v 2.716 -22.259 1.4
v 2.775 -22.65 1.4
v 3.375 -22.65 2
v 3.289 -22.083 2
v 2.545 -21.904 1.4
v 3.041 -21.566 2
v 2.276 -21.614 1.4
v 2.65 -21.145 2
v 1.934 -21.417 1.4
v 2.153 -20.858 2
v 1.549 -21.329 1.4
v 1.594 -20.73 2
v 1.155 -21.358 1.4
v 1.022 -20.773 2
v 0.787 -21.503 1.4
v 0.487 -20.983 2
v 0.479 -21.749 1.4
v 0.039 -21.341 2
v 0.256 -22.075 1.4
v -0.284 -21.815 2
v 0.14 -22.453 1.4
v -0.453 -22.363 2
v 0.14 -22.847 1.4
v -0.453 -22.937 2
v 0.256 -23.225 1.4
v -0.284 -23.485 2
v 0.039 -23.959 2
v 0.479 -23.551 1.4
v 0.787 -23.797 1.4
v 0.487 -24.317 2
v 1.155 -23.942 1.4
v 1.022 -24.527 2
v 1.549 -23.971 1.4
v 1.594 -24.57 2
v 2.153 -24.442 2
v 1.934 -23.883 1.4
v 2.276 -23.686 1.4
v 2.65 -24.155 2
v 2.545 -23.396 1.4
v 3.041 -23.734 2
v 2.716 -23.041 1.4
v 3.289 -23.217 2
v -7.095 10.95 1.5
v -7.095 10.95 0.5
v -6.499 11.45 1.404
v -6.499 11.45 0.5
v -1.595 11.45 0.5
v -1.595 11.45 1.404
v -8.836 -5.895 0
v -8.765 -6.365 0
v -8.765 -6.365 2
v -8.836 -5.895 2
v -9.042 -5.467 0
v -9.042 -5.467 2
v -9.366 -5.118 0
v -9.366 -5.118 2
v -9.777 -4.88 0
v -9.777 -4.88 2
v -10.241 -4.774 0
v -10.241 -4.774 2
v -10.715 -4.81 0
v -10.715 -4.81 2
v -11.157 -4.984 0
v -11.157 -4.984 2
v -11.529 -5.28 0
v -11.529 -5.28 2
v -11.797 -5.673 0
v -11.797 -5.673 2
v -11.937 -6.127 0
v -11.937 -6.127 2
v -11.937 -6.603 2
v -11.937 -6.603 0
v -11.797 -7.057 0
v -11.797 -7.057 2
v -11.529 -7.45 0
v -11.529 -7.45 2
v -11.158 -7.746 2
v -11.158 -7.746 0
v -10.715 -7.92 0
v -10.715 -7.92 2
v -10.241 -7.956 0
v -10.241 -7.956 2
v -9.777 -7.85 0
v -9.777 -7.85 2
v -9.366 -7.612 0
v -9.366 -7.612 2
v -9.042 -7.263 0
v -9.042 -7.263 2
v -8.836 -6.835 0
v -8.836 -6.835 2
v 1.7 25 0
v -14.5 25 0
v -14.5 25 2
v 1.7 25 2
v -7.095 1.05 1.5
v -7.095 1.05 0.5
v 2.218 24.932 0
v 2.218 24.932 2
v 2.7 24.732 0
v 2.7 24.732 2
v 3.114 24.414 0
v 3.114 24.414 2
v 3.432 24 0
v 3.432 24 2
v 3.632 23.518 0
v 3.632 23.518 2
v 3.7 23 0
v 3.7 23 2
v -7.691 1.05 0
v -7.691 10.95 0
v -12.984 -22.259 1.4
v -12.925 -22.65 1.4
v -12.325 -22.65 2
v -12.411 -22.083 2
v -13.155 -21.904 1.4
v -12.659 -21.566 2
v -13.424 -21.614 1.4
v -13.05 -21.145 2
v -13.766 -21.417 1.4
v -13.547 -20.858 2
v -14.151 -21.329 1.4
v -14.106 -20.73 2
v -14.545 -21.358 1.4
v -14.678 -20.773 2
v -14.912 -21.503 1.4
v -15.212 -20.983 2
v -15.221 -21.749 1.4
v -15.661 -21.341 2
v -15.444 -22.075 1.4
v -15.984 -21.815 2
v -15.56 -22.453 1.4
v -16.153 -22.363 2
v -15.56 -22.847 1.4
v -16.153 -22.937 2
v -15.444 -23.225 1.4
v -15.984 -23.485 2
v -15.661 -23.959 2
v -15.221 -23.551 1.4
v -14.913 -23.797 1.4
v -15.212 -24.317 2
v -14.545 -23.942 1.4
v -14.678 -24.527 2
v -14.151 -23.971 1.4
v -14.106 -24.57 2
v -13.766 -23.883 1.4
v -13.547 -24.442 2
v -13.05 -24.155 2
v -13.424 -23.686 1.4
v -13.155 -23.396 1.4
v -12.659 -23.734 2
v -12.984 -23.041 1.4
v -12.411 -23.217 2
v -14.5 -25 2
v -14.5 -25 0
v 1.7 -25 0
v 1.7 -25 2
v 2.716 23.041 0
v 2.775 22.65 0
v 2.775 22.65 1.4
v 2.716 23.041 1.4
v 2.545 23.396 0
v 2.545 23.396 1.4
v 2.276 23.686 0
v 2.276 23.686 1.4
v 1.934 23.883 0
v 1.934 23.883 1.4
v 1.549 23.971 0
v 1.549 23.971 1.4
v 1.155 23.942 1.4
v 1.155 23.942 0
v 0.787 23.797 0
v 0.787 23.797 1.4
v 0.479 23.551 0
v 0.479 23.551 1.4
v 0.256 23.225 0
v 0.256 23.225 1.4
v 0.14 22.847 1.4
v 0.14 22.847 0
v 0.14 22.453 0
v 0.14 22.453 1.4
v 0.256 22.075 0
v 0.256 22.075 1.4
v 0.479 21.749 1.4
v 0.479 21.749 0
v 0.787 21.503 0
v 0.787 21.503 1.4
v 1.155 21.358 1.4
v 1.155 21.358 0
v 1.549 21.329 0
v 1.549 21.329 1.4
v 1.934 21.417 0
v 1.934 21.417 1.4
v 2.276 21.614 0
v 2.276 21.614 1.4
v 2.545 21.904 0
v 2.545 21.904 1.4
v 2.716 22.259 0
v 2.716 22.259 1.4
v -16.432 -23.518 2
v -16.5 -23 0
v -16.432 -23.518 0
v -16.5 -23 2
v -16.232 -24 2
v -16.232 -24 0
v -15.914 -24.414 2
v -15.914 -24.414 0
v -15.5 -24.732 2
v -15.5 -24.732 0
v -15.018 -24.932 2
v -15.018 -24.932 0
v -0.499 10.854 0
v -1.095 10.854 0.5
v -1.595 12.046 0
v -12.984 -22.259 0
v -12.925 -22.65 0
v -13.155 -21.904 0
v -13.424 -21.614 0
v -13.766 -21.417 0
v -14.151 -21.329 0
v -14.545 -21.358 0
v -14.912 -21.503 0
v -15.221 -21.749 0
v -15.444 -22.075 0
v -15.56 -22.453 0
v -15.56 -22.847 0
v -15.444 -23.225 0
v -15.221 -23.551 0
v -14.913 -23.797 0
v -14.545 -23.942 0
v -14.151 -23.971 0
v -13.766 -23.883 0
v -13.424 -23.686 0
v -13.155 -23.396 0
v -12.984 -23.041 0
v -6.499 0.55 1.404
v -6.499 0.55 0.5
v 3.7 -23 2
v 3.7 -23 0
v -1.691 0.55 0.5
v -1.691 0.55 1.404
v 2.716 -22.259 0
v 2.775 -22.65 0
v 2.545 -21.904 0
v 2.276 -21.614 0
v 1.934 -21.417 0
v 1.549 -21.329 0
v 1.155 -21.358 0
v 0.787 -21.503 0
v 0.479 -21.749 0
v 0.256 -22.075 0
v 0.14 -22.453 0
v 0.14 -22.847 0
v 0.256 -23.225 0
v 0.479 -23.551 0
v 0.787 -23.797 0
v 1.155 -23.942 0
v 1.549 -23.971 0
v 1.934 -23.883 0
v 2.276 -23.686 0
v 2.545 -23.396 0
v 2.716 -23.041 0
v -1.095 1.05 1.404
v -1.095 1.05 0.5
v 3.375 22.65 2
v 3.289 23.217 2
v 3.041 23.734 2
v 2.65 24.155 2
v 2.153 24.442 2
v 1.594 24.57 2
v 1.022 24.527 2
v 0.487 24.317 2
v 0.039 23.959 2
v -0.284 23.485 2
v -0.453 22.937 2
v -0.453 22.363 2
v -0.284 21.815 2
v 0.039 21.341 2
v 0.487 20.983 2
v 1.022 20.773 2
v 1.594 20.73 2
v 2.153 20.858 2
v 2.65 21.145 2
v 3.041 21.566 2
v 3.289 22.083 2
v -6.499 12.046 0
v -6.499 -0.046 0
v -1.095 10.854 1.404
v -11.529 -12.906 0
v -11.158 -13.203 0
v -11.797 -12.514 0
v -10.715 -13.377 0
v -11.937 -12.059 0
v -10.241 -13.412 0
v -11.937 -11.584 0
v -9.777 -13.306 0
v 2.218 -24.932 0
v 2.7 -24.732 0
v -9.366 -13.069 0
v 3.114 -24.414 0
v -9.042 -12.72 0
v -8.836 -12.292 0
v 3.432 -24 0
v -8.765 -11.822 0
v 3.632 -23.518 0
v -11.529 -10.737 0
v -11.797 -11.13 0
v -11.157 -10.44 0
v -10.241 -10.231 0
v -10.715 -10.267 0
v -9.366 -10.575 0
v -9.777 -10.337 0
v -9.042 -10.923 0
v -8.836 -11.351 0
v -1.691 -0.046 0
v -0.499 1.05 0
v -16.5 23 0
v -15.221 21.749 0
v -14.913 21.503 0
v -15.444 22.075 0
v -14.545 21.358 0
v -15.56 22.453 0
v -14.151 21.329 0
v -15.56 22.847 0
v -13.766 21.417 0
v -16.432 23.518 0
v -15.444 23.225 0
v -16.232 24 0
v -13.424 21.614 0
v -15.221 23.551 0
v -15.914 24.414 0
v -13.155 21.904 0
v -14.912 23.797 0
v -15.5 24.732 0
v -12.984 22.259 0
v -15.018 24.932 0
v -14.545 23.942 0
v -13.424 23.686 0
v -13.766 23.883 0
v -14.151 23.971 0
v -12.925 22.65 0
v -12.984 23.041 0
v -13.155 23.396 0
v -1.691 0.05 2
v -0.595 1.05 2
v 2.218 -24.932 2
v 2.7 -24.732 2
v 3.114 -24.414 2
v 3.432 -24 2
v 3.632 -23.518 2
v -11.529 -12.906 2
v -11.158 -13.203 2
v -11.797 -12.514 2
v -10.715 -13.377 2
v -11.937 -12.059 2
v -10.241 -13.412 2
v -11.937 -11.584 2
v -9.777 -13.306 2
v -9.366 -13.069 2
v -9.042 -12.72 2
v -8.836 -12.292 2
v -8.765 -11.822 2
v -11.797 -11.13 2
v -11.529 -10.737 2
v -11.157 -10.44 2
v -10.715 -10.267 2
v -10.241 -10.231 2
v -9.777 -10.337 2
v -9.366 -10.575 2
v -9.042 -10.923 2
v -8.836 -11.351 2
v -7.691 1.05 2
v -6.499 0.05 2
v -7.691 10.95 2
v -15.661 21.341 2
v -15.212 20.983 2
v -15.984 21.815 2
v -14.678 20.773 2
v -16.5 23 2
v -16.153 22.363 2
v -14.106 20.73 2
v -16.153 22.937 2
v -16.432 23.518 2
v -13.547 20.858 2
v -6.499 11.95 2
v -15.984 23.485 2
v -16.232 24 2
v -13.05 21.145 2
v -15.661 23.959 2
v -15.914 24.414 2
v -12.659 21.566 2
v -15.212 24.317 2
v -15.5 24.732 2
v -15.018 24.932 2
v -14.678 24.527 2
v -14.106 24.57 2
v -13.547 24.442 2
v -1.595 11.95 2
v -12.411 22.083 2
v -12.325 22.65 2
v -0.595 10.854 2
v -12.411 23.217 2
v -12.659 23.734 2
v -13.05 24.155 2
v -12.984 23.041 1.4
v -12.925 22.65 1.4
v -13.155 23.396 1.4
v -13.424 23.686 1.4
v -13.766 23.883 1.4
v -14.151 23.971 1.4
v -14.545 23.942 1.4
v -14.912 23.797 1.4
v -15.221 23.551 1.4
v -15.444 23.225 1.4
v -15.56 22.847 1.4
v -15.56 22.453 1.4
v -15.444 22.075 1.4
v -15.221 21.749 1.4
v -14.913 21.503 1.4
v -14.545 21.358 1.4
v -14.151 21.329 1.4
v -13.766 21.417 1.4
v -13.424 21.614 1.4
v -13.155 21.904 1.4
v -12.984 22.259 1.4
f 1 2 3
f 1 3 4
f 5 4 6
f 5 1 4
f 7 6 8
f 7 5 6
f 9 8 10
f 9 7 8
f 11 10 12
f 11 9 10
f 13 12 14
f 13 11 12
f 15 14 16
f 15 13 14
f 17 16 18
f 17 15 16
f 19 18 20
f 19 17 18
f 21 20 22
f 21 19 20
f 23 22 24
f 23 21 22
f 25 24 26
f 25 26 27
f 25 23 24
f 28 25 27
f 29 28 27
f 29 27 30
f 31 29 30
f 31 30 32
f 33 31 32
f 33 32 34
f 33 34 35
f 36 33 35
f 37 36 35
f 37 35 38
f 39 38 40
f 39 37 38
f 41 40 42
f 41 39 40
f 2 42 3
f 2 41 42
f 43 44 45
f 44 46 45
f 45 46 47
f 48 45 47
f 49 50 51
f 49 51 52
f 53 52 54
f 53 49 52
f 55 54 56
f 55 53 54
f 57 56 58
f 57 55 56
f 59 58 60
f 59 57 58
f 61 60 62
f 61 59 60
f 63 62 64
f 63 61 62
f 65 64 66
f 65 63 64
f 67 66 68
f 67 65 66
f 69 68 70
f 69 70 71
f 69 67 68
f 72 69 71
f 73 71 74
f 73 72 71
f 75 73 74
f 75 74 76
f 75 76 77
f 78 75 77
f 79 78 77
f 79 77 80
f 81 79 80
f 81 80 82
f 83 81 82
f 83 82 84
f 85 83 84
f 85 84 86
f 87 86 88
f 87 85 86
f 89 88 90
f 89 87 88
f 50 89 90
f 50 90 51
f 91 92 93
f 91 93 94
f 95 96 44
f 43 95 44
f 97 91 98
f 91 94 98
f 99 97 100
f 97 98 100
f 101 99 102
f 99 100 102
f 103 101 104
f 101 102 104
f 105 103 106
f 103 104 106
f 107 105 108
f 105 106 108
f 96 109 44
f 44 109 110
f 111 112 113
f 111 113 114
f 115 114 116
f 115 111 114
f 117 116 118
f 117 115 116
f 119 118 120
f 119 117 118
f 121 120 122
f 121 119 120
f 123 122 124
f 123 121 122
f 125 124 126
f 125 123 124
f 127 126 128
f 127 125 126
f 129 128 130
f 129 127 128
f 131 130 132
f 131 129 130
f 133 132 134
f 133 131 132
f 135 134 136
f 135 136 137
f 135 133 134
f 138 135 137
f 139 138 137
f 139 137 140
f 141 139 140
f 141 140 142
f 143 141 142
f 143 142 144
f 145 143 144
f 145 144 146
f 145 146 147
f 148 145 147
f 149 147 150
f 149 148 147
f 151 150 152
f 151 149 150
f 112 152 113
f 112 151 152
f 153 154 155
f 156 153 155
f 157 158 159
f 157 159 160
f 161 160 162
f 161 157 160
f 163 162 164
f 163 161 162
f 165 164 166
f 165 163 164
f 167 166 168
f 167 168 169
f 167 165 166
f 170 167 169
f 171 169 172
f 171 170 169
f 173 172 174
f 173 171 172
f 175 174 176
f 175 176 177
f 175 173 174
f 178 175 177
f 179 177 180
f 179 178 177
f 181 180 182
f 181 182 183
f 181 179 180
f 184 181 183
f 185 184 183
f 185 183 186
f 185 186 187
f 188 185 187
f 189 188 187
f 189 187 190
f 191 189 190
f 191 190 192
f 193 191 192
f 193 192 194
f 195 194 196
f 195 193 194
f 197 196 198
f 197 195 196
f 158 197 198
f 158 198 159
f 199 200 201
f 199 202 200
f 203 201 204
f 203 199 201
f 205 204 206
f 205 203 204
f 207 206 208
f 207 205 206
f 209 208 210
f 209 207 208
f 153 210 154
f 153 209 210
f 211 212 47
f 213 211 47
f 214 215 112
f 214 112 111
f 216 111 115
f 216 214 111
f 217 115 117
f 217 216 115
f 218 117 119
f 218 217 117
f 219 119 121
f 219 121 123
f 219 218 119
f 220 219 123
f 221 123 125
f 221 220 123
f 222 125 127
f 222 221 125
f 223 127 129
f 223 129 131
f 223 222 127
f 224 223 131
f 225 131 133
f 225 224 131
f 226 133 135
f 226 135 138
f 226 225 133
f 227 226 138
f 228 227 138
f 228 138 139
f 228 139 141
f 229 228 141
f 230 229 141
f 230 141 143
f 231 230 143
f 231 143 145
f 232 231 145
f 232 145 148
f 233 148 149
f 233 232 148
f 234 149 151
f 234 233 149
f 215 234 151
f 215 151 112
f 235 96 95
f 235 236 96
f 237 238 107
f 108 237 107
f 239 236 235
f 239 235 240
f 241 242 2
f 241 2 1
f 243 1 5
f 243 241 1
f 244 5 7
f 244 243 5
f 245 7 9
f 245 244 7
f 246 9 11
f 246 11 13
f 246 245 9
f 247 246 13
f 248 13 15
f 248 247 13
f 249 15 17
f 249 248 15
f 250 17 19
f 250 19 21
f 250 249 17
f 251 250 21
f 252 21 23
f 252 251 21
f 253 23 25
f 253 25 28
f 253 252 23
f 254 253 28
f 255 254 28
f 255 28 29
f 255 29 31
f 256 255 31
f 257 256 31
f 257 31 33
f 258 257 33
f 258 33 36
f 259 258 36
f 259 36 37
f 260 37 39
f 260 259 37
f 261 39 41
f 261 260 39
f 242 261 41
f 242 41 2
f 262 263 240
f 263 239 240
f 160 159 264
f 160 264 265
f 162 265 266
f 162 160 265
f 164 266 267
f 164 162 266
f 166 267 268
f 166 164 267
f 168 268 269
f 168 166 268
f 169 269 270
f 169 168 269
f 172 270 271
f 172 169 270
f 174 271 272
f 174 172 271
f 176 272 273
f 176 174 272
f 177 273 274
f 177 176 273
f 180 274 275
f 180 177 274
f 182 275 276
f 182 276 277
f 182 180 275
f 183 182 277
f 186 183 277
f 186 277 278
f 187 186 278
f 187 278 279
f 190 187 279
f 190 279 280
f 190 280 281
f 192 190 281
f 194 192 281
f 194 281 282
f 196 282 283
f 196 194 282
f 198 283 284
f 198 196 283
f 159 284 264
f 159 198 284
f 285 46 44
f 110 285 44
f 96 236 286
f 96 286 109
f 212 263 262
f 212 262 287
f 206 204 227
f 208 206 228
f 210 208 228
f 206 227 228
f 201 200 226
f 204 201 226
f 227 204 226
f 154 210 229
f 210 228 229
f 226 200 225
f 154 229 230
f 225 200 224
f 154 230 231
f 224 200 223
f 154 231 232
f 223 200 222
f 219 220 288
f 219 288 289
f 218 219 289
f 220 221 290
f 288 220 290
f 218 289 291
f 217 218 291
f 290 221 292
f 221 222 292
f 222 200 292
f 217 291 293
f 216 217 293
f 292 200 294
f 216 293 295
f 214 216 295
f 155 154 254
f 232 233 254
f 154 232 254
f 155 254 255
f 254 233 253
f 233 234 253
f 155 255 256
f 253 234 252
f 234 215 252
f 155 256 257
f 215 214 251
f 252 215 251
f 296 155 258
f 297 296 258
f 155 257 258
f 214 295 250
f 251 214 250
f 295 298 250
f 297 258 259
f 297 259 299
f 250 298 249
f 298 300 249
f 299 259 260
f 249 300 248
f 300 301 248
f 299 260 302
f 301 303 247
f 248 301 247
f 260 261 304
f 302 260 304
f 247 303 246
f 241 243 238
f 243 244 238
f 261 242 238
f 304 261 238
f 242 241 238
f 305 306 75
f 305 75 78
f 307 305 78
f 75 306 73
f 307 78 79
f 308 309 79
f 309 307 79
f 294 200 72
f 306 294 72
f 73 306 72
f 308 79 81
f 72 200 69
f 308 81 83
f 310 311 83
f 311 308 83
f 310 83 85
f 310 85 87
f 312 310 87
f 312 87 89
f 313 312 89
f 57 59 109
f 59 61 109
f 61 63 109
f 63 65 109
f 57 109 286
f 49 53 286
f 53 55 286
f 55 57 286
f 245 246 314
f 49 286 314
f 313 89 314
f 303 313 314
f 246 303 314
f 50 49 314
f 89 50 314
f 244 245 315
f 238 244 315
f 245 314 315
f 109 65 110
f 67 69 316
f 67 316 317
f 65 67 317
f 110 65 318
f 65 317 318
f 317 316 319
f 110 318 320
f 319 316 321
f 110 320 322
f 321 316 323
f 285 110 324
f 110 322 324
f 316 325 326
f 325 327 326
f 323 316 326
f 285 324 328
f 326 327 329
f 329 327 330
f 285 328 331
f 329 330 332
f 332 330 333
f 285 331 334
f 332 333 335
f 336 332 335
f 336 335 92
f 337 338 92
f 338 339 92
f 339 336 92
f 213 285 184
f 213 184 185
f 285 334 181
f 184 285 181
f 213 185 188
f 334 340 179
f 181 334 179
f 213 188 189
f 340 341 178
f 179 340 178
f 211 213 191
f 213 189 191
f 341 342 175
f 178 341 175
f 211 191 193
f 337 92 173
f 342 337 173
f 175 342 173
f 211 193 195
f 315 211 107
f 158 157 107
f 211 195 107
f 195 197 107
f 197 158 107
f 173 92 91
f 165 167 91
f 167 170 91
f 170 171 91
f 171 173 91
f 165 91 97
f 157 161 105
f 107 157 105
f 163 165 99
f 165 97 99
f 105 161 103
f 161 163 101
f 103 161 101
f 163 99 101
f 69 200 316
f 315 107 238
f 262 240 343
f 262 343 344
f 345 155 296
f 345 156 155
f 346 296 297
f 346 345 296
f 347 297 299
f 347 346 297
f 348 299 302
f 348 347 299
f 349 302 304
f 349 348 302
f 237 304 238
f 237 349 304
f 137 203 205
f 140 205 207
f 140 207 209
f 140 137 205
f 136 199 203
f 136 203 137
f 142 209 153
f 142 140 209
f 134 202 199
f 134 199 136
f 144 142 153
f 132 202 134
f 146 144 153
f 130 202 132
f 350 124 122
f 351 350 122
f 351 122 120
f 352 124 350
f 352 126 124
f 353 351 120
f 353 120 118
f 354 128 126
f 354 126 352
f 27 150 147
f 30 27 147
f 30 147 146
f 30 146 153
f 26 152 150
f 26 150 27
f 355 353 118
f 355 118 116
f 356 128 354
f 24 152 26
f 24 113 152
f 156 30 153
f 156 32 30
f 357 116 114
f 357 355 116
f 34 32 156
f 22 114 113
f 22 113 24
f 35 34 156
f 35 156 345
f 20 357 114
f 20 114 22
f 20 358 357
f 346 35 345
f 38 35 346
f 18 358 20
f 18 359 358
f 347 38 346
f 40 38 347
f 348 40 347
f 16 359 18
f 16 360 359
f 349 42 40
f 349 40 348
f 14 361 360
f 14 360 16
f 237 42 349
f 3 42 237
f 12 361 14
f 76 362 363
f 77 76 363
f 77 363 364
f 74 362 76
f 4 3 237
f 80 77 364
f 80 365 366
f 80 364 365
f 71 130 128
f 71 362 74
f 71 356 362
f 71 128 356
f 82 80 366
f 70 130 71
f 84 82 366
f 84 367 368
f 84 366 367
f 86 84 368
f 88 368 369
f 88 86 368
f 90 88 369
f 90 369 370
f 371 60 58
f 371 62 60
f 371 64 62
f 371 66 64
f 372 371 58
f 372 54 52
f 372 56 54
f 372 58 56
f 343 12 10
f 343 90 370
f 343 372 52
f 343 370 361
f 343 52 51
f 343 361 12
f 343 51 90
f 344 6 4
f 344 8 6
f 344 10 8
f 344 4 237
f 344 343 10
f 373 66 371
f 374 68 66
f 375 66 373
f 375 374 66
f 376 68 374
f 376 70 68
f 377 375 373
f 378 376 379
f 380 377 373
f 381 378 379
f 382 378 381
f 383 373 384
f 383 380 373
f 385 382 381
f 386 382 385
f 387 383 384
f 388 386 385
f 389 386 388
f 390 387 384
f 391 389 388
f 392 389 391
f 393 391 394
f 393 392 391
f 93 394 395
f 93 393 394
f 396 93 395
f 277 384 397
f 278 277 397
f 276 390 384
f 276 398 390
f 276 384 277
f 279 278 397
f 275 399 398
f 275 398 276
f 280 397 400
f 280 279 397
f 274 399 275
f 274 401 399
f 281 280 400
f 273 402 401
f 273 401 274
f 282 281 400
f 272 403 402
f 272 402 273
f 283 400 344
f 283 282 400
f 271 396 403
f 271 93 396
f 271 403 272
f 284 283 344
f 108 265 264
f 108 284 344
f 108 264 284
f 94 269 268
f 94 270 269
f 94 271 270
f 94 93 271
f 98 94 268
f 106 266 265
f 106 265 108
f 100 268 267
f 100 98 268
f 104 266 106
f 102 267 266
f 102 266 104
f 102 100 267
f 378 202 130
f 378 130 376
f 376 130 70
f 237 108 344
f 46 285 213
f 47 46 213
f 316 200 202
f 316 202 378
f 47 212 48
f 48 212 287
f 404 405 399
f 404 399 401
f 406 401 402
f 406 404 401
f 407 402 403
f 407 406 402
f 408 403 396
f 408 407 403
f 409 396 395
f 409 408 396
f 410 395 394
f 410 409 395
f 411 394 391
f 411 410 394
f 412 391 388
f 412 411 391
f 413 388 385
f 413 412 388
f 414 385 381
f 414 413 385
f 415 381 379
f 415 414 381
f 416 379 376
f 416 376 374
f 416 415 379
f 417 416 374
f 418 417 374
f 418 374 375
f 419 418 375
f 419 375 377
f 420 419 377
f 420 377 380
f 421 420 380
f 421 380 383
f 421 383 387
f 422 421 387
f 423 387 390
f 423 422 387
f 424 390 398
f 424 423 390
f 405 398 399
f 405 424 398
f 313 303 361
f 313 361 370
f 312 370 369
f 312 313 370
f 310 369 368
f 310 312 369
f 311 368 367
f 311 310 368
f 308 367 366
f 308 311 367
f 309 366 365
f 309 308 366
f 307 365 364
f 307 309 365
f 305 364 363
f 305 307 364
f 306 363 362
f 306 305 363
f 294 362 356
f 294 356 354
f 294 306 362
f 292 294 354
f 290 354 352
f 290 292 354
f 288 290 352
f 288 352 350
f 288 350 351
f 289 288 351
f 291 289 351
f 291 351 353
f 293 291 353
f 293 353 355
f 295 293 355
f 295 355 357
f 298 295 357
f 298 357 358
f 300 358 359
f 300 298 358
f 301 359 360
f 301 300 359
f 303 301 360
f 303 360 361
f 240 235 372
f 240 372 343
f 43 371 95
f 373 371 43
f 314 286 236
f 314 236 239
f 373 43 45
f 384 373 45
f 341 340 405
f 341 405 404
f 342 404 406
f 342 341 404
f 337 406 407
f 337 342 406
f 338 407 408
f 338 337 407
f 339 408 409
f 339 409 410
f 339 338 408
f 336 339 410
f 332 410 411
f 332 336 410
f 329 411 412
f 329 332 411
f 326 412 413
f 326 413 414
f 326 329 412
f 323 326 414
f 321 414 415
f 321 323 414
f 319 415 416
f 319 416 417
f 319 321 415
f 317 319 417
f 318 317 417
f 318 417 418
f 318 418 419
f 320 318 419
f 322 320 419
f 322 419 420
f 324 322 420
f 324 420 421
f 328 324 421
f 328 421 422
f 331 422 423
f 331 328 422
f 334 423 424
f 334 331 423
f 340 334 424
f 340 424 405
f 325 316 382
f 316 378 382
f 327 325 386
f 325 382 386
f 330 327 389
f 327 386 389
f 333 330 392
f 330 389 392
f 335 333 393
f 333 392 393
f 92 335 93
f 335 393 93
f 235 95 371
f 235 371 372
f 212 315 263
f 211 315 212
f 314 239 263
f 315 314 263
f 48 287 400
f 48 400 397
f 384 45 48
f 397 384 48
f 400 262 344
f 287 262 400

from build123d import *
from OCP.BRepFilletAPI import BRepFilletAPI_MakeChamfer

# Parameters (mm, degrees)
SKETCH_1_W      = 20.2
SKETCH_1_H      = 50
SKETCH_1_R      = 1.325
SKETCH_1_R_2    = 1.595
SKETCH_1_W_2    = 6
SKETCH_1_H_2    = 10.9
EXTRUDE_1_DEPTH = 2
FILLET_1_R      = 2
CHAMFER_1_SIZE  = 0.6
CHAMFER_2_SIZE  = 0.5
CHAMFER_2_SIZE2 = 0.595876796


with BuildPart() as part:
    # 草图1 → 凸台-拉伸1 (new body)
    with BuildSketch(Plane.XY):
        with Locations((-6.4, 0)):
            Rectangle(SKETCH_1_W, SKETCH_1_H)
        with Locations((-14.25, -22.65)):
            Circle(SKETCH_1_R, mode=Mode.SUBTRACT)
        with Locations((-14.25, 22.65)):
            Circle(SKETCH_1_R, mode=Mode.SUBTRACT)
        with Locations((1.45, 22.65)):
            Circle(SKETCH_1_R, mode=Mode.SUBTRACT)
        with Locations((1.45, -22.65)):
            Circle(SKETCH_1_R, mode=Mode.SUBTRACT)
        with Locations((-10.36, -6.365)):
            Circle(SKETCH_1_R_2, mode=Mode.SUBTRACT)
        with Locations((-10.36, -11.8216)):
            Circle(SKETCH_1_R_2, mode=Mode.SUBTRACT)
        with Locations((-4.095, 6)):
            Rectangle(SKETCH_1_W_2, SKETCH_1_H_2, mode=Mode.SUBTRACT)
    extrude(amount=EXTRUDE_1_DEPTH)

    # 圆角1
    fillet_1_edges = [part.edges().sort_by_distance(p)[0] for p in [
        (-16.5, 25, 1),
        (3.7, 25, 1),
        (3.7, -25, 1),
        (-16.5, -25, 1),
    ]]
    fillet(fillet_1_edges, radius=FILLET_1_R)

    # 倒角1
    chamfer_1_edges = [part.edges().sort_by_distance(p)[0] for p in [
        (-15.575, -22.65, 2),
        (-15.575, 22.65, 2),
        (0.125, 22.65, 2),
        (0.125, -22.65, 2),
    ]]
    chamfer(chamfer_1_edges, length=CHAMFER_1_SIZE)

    # 倒角2: one chamfer whose edges measure the first distance from different faces: ONE call of the kernel's chamfer builder (chamfer() names one face for all edges)
    chamfer_2_edges_1 = [part.edges().sort_by_distance(p)[0] for p in [
        (-7.095, 6, 0),
        (-7.095, 11.45, 1),
        (-7.095, 0.55, 1),
        (-7.095, 6, 2),
    ]]
    chamfer_2_side_1 = [part.faces().sort_by_distance(p)[0] for p in [
        (-7.095, 6, 1),
    ]]
    chamfer_2_edges_2 = [part.edges().sort_by_distance(p)[0] for p in [
        (-4.095, 0.55, 0),
    ]]
    chamfer_2_side_2 = [part.faces().sort_by_distance(p)[0] for p in [
        (-4.095, 0.55, 1),
    ]]
    chamfer_2_edges_3 = [part.edges().sort_by_distance(p)[0] for p in [
        (-1.095, 6, 0),
        (-1.095, 0.55, 1),
    ]]
    chamfer_2_side_3 = [part.faces().sort_by_distance(p)[0] for p in [
        (-1.095, 6, 1),
    ]]
    chamfer_2_edges_4 = [part.edges().sort_by_distance(p)[0] for p in [
        (-4.095, 11.45, 0),
        (-1.095, 11.45, 1),
    ]]
    chamfer_2_side_4 = [part.faces().sort_by_distance(p)[0] for p in [
        (-4.095, 11.45, 1),
    ]]
    chamfer_2_edges_5 = [part.edges().sort_by_distance(p)[0] for p in [
        (-4.095, 0.55, 2),
        (-1.095, 6, 2),
        (-4.095, 11.45, 2),
    ]]
    chamfer_2_side_5 = [part.faces().sort_by_distance(p)[0] for p in [
        (-6.499529382, -0.281178063, 2),
    ]]
    chamfer_2 = BRepFilletAPI_MakeChamfer(part.part.solid().wrapped)
    for e in chamfer_2_edges_1:
        chamfer_2.Add(CHAMFER_2_SIZE, CHAMFER_2_SIZE2, e.wrapped, chamfer_2_side_1[0].wrapped)  # the first distance lies on this face
    for e in chamfer_2_edges_2:
        chamfer_2.Add(CHAMFER_2_SIZE, CHAMFER_2_SIZE2, e.wrapped, chamfer_2_side_2[0].wrapped)  # the first distance lies on this face
    for e in chamfer_2_edges_3:
        chamfer_2.Add(CHAMFER_2_SIZE, CHAMFER_2_SIZE2, e.wrapped, chamfer_2_side_3[0].wrapped)  # the first distance lies on this face
    for e in chamfer_2_edges_4:
        chamfer_2.Add(CHAMFER_2_SIZE, CHAMFER_2_SIZE2, e.wrapped, chamfer_2_side_4[0].wrapped)  # the first distance lies on this face
    for e in chamfer_2_edges_5:
        chamfer_2.Add(CHAMFER_2_SIZE, CHAMFER_2_SIZE2, e.wrapped, chamfer_2_side_5[0].wrapped)  # the first distance lies on this face
    add(Compound.cast(chamfer_2.Shape()), mode=Mode.REPLACE)


solid = part.part
